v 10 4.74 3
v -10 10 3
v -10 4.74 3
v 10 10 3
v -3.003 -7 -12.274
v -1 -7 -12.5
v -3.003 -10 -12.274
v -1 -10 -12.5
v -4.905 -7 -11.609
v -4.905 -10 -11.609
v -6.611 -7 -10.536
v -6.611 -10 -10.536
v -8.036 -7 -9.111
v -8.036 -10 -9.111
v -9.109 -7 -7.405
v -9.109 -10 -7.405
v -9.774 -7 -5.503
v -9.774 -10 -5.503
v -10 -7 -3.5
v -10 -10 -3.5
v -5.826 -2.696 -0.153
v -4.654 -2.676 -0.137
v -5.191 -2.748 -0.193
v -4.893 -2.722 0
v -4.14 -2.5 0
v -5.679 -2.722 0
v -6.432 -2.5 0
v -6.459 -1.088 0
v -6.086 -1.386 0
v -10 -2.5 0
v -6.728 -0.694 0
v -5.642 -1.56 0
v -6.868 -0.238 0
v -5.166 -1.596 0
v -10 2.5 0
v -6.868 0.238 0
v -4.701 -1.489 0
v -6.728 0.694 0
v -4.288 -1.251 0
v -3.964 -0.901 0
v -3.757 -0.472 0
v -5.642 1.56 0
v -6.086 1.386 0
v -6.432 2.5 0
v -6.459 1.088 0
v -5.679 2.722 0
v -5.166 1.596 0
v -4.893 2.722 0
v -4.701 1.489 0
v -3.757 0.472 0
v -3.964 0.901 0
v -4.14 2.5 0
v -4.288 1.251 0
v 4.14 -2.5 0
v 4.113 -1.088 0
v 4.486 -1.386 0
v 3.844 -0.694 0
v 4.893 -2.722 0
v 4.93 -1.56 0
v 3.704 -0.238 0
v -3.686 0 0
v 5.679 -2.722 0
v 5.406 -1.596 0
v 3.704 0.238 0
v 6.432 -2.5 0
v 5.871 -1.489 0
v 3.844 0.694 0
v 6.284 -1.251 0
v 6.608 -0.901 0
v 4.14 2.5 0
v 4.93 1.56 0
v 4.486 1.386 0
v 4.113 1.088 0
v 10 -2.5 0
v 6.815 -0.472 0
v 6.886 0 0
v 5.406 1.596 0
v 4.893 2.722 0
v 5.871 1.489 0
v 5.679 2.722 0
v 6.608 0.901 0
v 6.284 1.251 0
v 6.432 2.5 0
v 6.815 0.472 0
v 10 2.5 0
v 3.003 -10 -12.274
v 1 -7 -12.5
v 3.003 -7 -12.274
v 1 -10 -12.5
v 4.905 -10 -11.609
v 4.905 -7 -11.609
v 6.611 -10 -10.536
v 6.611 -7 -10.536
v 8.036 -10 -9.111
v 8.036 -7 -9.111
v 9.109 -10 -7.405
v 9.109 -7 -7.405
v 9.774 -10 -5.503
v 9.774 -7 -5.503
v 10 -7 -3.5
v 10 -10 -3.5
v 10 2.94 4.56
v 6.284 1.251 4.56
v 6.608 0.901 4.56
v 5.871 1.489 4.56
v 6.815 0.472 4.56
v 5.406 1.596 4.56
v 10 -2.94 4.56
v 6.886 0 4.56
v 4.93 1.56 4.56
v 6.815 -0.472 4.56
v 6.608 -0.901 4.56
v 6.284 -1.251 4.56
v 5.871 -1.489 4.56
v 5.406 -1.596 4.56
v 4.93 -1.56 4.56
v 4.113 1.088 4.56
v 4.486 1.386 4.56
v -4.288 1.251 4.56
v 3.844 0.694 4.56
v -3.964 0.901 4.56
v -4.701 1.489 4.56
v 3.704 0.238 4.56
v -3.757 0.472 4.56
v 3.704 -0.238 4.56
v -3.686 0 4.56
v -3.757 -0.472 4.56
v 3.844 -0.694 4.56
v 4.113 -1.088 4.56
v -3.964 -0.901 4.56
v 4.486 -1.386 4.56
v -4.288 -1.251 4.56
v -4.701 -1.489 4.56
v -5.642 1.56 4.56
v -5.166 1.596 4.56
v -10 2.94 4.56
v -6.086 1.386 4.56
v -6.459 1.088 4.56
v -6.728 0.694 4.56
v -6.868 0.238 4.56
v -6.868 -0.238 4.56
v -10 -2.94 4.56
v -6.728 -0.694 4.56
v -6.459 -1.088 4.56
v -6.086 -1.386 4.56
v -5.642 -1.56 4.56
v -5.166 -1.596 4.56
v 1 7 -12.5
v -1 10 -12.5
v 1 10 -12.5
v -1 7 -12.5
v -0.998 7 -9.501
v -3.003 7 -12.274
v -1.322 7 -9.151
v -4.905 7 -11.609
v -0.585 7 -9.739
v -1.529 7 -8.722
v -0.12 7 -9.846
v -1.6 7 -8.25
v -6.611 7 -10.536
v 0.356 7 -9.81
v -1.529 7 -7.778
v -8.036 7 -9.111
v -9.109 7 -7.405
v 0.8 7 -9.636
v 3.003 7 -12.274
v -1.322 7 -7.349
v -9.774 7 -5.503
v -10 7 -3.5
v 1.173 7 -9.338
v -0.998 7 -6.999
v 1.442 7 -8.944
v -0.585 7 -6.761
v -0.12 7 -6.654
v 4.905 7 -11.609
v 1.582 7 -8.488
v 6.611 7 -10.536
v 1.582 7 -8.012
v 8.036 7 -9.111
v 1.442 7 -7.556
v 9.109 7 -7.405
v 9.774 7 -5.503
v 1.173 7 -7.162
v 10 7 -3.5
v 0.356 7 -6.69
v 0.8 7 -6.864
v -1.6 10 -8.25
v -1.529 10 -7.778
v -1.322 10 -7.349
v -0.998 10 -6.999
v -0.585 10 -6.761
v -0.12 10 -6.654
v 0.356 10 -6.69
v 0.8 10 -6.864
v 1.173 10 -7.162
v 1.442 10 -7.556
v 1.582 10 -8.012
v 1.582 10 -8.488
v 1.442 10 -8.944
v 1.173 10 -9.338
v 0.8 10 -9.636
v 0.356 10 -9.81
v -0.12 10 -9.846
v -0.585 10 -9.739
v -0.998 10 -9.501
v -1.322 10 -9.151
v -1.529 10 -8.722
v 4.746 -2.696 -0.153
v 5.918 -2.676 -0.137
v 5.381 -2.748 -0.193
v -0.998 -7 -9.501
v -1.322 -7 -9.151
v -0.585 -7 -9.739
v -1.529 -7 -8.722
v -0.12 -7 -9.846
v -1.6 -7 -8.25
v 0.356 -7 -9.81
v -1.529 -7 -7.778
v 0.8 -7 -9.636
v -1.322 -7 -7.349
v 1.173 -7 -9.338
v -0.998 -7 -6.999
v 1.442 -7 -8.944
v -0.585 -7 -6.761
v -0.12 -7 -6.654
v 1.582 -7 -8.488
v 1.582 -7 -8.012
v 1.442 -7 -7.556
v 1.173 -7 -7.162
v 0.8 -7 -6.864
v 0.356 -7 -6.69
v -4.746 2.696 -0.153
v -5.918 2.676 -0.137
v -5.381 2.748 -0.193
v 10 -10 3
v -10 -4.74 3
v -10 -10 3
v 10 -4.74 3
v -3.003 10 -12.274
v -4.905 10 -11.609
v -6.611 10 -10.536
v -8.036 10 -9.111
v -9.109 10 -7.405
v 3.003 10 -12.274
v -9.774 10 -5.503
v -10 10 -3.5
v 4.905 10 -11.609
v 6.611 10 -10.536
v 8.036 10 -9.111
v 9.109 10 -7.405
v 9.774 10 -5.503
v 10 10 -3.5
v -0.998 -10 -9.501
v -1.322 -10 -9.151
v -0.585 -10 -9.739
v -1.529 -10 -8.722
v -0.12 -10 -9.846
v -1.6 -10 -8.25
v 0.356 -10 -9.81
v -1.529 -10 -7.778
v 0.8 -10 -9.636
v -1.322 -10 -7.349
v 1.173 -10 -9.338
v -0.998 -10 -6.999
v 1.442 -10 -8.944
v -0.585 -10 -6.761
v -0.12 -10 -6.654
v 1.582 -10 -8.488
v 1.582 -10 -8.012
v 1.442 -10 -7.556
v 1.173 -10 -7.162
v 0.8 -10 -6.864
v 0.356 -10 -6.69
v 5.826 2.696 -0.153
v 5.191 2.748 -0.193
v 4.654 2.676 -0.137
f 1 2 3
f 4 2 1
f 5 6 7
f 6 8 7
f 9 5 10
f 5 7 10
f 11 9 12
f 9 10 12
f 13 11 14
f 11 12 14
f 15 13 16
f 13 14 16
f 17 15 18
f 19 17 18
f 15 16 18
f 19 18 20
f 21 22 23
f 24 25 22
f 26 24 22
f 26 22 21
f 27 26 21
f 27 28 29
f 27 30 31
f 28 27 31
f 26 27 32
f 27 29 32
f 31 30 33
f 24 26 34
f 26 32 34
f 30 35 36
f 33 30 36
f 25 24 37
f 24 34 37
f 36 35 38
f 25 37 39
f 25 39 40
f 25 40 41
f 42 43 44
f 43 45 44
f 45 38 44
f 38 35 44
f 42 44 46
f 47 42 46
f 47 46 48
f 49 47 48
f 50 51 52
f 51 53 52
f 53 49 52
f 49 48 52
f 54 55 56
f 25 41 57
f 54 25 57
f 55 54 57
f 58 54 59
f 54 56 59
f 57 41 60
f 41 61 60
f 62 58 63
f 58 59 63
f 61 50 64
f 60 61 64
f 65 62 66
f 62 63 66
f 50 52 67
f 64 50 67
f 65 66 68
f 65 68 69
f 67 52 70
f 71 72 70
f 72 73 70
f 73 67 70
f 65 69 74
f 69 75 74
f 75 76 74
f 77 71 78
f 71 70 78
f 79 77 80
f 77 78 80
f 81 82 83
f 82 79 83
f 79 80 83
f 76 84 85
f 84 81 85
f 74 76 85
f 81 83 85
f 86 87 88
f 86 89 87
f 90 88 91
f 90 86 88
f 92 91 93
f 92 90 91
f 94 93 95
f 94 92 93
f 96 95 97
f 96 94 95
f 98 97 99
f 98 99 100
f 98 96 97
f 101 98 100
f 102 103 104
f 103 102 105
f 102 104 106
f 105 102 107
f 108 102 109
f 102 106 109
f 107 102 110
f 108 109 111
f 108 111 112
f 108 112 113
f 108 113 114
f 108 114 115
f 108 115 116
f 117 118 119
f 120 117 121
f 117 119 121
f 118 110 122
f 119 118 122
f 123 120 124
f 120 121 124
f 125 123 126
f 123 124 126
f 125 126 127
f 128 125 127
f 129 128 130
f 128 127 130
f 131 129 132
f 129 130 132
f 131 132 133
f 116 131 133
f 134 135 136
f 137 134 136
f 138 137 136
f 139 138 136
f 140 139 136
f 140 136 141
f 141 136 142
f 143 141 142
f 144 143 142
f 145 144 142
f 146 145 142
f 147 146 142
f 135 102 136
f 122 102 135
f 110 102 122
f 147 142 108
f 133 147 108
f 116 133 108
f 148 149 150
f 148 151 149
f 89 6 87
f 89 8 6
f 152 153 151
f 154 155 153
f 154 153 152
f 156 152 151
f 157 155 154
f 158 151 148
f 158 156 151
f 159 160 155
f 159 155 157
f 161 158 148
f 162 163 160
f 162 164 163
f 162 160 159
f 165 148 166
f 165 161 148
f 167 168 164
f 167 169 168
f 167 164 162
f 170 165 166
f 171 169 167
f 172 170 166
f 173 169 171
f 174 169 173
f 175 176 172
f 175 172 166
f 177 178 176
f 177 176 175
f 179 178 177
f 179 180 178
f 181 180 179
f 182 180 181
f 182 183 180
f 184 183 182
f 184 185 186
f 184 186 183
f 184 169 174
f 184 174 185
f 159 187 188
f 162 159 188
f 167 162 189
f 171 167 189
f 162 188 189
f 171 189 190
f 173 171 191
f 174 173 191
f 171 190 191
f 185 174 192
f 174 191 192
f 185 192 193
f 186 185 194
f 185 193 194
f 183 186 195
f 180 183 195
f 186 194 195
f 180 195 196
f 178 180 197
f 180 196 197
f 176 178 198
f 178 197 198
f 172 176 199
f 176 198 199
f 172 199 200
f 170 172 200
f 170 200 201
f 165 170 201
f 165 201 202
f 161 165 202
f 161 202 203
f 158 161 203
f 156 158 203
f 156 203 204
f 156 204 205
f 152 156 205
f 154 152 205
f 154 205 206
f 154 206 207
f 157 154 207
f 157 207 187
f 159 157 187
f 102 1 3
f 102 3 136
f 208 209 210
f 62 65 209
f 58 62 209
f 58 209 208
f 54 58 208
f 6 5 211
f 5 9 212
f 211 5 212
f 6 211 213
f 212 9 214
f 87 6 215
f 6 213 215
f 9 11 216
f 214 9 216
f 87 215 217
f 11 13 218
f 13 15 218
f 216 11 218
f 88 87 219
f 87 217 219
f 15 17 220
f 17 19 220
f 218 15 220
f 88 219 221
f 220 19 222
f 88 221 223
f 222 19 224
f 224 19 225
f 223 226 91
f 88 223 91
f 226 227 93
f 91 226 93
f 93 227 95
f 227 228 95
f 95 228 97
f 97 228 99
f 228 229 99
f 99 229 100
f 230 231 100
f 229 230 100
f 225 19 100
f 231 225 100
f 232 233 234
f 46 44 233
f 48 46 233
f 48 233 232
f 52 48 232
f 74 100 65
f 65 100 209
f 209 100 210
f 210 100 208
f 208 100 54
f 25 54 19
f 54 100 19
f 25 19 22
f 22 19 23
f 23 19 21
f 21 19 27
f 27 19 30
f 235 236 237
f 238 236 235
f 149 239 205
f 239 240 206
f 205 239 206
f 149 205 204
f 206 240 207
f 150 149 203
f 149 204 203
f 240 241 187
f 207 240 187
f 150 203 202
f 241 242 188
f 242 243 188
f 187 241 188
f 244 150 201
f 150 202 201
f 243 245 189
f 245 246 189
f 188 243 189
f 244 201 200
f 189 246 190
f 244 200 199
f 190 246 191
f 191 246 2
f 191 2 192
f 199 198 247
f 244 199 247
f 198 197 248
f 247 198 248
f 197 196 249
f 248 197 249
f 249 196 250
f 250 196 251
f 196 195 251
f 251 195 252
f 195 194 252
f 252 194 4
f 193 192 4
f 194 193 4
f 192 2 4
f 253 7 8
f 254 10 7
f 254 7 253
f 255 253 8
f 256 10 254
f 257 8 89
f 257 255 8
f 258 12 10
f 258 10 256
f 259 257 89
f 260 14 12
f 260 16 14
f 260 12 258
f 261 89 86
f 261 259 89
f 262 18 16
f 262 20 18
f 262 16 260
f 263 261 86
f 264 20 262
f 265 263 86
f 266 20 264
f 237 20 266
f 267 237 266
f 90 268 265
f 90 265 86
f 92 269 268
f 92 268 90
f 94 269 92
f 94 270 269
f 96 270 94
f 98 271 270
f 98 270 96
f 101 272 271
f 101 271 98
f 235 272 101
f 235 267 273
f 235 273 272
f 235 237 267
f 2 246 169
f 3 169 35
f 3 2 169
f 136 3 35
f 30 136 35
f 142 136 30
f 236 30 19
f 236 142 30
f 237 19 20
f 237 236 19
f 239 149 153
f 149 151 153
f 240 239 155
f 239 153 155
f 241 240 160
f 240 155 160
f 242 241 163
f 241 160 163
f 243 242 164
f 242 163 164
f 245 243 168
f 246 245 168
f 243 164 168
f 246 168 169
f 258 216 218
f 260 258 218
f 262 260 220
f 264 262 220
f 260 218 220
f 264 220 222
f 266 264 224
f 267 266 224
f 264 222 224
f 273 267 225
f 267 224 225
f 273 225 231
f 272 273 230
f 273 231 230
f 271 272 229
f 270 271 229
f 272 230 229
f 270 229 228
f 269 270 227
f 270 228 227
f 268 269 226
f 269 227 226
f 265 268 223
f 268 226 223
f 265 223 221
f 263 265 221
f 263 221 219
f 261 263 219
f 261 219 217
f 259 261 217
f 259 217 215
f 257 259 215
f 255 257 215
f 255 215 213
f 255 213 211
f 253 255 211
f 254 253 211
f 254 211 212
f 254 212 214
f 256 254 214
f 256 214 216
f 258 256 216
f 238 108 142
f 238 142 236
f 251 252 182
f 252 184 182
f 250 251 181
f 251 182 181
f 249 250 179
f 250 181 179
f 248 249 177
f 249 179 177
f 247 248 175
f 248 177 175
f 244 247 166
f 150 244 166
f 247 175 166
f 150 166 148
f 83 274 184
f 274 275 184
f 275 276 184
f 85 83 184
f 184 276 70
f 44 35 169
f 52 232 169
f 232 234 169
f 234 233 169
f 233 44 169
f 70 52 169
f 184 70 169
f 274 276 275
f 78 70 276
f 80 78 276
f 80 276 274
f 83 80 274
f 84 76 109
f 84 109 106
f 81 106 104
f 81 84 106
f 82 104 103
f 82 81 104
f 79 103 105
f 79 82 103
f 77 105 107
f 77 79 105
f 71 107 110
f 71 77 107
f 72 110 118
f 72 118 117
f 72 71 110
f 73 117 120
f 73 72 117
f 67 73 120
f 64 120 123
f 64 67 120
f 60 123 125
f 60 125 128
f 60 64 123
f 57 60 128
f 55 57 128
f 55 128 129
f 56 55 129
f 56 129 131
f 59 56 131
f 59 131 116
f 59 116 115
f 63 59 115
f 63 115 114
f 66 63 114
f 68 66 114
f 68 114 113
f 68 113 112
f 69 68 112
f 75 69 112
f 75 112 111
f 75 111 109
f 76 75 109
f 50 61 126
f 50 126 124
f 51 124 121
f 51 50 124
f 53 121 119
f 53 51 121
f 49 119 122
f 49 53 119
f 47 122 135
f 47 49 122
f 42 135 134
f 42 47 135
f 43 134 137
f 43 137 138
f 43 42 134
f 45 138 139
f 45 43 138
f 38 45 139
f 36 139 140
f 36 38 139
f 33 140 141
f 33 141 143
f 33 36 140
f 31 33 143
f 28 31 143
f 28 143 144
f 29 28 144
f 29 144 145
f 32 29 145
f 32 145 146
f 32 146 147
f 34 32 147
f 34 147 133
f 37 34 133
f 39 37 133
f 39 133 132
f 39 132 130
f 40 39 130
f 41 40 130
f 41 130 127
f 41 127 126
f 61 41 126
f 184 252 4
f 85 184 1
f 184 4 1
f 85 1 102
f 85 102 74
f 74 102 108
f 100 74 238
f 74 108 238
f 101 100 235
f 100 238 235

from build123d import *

# Parameters (mm, degrees)
SKETCH_W        = 20
SKETCH_H        = 20
SKETCH_R        = 1.6
PAD_DEPTH       = 3
PAD001_DEPTH    = 20
SKETCH002_R     = 1.6
POCKET_DEPTH    = 4.561
SKETCH003_W     = 20
SKETCH003_H     = 3
PAD002_DEPTH    = 12.5
SKETCH005_R     = 1.6
POCKET002_DEPTH = 20.001
POCKET003_DEPTH = 20.001
SKETCH006_W     = 20
SKETCH006_H     = 4.5
PAD003_DEPTH    = 3.5
POCKET004_DEPTH = 20.001
SKETCH008_R     = 2.75
POCKET005_DEPTH = 12.501
PAD004_DEPTH    = 20
SKETCH010_R     = 1.6
POCKET006_DEPTH = 17.061
FILLET_R        = 9


with BuildPart() as part:
    # Sketch → Pad (new body)
    with BuildSketch(Plane.XY):
        Rectangle(SKETCH_W, SKETCH_H)
        with Locations((-5.286, 0)):
            Circle(SKETCH_R, mode=Mode.SUBTRACT)
        with Locations((5.286, 0)):
            Circle(SKETCH_R, mode=Mode.SUBTRACT)
    extrude(amount=PAD_DEPTH)

    # Sketch001 (on Face1 of Pad) → Pad001 (join)
    with BuildSketch(Plane(origin=(0, 10, 0), x_dir=(-1, 0, 0), z_dir=(0, 1, 0))):
        Polygon((0, 3), (-4.74, 3), (-2.94, 4.56), (2.94, 4.56), (4.74, 3), align=None)
    extrude(amount=-PAD001_DEPTH)

    # Sketch002 (on Face4 of Pad001) → Pocket (cut, through all)
    with BuildSketch(Plane(origin=(0, 0, 0), x_dir=(1, 0, 0), z_dir=(0, 0, -1))):
        with Locations((-5.286, 0)):
            Circle(SKETCH002_R)
        with Locations((5.286, 0)):
            Circle(SKETCH002_R)
    extrude(amount=-POCKET_DEPTH, mode=Mode.SUBTRACT)

    # Sketch003 (on Face4 of Pocket) → Pad002 (join)
    with BuildSketch(Plane(origin=(0, 0, 0), x_dir=(1, 0, 0), z_dir=(0, 0, -1))):
        with Locations((0, 8.5)):
            Rectangle(SKETCH003_W, SKETCH003_H)
        with Locations((0, -8.5)):
            Rectangle(SKETCH003_W, SKETCH003_H)
    extrude(amount=PAD002_DEPTH)

    # Sketch005 → Pocket002 (cut, through all)
    with BuildSketch(Plane(origin=(0, 10, 0), x_dir=(-1, 0, 0), z_dir=(0, 1, 0))):
        with Locations((0, -8.25)):
            Circle(SKETCH005_R)
    extrude(amount=-POCKET002_DEPTH, mode=Mode.SUBTRACT)

    # Pocket002 Face22 → Pocket003 (cut, through all)
    with BuildSketch(Plane(origin=(0, -10, 3.719063), x_dir=(-1, 0, 0), z_dir=(0, -1, 0))):
        Polygon((-4.74, 0.719063), (-2.94, -0.840937), (2.94, -0.840937), (4.74, 0.719063), (0, 0.719063), align=None)
    extrude(amount=-POCKET003_DEPTH, mode=Mode.SUBTRACT)

    # Sketch006 (on Face11 of Pocket003) → Pad003 (join)
    with BuildSketch(Plane(origin=(0, 0, 0), x_dir=(1, 0, 0), z_dir=(0, 0, -1))):
        with Locations((0, 4.75)):
            Rectangle(SKETCH006_W, SKETCH006_H)
        with Locations((0, -4.75)):
            Rectangle(SKETCH006_W, SKETCH006_H)
    extrude(amount=PAD003_DEPTH)

    # Sketch007 (on Face17 of Pad003) → Pocket004 (cut, through all)
    with BuildSketch(Plane(origin=(-10, 0, 0), x_dir=(0, -1, 0), z_dir=(-1, 0, 0))):
        Polygon((-2.5, 0), (-7, -3.5), (-2.5, -3.5), align=None)
        Polygon((7, -3.5), (2.5, 0), (2.5, -3.5), align=None)
    extrude(amount=-POCKET004_DEPTH, mode=Mode.SUBTRACT)

    # Sketch008 (on Face12 of Pocket004) → Pocket005 (cut, through all)
    with BuildSketch(Plane(origin=(0, 0, 0), x_dir=(1, 0, 0), z_dir=(0, 0, -1))):
        with Locations((-5.286, 0)):
            Circle(SKETCH008_R)
        with Locations((5.286, 0)):
            Circle(SKETCH008_R)
    extrude(amount=POCKET005_DEPTH, mode=Mode.SUBTRACT)

    # Sketch009 (on Face3 of Pocket005) → Pad004 (join)
    with BuildSketch(Plane(origin=(-10, 0, 0), x_dir=(0, -1, 0), z_dir=(-1, 0, 0))):
        Polygon((0, 3), (-4.74, 3), (-2.94, 4.56), (2.94, 4.56), (4.74, 3), align=None)
    extrude(amount=-PAD004_DEPTH)

    # Sketch010 (on Face37 of Pad004) → Pocket006 (cut, through all)
    with BuildSketch(Plane.XY.offset(4.56)):
        with Locations((5.286, 0)):
            Circle(SKETCH010_R)
        with Locations((-5.286, 0)):
            Circle(SKETCH010_R)
    extrude(amount=-POCKET006_DEPTH, mode=Mode.SUBTRACT)

    # Fillet
    fillet_edges = [part.edges().sort_by_distance(p)[0] for p in [
        (-10, -8.5, -12.5),
        (10, 8.5, -12.5),
        (-10, 8.5, -12.5),
        (10, -8.5, -12.5),
    ]]
    fillet(fillet_edges, radius=FILLET_R)


solid = part.part
